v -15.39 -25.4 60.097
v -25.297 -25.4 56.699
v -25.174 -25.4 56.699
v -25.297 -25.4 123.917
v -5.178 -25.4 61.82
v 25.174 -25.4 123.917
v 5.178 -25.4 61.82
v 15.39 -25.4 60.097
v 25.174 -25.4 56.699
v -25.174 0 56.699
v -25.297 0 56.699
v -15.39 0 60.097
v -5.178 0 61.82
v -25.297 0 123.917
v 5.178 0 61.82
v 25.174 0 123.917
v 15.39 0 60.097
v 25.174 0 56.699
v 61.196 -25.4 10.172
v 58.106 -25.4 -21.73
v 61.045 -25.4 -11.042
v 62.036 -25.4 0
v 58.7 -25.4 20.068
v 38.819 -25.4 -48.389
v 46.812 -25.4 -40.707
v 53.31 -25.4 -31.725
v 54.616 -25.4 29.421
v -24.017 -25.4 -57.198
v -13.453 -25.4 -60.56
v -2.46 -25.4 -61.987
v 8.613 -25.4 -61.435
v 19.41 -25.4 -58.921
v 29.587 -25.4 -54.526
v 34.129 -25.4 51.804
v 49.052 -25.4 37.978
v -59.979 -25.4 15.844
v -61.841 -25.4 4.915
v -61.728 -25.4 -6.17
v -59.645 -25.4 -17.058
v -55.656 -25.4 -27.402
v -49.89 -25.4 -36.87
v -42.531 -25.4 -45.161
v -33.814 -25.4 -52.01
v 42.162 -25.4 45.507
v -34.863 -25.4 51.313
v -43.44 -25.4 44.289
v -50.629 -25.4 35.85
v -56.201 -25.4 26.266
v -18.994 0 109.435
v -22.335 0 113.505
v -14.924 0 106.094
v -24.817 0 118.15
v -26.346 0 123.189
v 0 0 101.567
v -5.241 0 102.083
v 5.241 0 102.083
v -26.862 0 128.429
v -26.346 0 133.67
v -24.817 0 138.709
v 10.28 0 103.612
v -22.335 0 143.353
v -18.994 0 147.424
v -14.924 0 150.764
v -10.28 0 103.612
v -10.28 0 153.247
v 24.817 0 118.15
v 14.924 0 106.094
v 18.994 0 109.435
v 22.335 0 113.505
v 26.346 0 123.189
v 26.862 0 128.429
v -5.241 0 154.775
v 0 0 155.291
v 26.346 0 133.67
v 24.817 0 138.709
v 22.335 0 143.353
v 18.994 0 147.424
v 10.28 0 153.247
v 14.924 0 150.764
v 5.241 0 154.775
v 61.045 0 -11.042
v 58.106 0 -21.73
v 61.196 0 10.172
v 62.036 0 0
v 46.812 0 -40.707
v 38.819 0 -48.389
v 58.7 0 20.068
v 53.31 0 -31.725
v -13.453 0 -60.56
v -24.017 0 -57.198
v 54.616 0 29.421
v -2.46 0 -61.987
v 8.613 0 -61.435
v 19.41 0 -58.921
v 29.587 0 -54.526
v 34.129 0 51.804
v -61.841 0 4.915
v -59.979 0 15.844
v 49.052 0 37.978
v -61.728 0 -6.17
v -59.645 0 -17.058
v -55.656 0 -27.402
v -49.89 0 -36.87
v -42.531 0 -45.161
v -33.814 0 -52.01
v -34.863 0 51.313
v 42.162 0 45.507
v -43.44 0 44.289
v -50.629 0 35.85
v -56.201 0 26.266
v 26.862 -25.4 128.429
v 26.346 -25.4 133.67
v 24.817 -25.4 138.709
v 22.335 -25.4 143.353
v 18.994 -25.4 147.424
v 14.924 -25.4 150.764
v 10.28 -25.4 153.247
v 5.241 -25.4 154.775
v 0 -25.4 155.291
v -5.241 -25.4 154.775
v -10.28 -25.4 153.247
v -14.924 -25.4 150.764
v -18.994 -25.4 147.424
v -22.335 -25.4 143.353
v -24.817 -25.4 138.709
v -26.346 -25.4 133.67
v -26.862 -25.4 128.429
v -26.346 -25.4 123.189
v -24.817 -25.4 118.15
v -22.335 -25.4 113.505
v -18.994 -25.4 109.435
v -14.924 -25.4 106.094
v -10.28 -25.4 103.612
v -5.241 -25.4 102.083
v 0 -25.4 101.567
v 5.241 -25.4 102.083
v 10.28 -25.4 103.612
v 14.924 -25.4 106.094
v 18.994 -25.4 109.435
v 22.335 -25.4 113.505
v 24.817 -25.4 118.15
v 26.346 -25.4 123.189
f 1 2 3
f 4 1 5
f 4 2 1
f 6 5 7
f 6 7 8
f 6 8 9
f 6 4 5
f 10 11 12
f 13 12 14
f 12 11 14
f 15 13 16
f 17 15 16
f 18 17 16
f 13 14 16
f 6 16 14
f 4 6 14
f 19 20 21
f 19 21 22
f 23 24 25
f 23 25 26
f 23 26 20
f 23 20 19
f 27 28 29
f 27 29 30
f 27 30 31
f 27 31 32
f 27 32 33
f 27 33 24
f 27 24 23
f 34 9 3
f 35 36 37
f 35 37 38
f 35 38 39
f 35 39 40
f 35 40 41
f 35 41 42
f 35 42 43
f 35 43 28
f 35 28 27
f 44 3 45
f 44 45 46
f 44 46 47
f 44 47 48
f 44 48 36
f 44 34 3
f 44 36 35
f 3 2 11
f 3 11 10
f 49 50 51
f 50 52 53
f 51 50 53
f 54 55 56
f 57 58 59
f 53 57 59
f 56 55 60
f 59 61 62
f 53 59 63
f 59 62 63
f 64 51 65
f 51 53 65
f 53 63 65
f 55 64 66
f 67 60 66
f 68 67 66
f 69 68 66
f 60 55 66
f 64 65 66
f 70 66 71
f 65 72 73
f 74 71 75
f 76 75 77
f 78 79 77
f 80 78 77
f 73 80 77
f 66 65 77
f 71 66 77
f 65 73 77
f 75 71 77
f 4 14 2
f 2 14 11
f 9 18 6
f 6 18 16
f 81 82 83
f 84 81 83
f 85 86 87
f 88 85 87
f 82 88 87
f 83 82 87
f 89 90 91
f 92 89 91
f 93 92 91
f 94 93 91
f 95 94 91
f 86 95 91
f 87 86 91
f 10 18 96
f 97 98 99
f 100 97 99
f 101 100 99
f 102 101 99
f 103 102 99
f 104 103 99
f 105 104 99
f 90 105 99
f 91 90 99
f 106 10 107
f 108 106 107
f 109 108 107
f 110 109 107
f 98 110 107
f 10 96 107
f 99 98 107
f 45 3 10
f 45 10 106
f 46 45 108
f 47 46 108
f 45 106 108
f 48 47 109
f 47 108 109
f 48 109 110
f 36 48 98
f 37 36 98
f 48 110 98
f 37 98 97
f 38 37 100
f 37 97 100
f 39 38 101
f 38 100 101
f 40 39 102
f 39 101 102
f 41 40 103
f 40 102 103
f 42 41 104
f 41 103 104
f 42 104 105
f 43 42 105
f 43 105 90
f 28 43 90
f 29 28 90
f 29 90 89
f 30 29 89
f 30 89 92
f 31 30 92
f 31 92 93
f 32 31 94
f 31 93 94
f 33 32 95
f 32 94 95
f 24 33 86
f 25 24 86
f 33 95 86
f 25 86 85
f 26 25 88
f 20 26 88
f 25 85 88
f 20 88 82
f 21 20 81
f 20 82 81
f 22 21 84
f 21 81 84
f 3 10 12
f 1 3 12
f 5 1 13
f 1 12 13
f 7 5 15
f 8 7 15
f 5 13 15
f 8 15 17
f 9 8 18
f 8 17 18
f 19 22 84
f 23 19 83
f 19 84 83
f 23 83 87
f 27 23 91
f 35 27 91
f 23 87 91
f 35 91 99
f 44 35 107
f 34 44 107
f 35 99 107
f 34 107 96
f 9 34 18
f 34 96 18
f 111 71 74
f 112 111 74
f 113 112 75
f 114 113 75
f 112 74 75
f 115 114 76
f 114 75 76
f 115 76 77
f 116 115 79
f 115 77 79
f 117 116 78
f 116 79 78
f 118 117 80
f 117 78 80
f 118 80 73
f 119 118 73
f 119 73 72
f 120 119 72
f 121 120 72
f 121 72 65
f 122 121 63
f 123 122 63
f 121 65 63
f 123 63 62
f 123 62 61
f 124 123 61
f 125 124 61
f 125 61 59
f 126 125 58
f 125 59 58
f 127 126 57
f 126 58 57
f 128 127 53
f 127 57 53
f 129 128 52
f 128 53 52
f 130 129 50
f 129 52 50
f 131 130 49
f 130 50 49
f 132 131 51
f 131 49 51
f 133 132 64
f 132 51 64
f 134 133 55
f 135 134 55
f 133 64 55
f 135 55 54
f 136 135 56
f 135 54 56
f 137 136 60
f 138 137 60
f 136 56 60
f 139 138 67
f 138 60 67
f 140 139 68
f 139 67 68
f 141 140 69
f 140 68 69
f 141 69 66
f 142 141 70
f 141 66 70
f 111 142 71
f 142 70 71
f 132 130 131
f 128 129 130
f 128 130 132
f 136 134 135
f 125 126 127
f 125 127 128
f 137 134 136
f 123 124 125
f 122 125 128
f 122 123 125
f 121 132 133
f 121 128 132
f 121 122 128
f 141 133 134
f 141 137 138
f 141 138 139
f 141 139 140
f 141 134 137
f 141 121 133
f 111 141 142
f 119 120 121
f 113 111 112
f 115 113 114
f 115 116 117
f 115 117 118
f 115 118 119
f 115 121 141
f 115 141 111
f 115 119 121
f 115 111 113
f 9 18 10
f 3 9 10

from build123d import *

# Parameters (mm, degrees)
F3_DEPTH = 25.4
F1_R     = 26.8621536908


with BuildPart() as f3:
    # F0 (on Front) → F3 (new body)
    with BuildSketch(Plane.XZ):
        with BuildLine():
            ThreePointArc((-25.17354644, 56.6988320916), (-33.8141903188, -52.0102445101), (62.0359976217, 0))
            ThreePointArc((62.0359976217, 0), (52.0102445101, 33.8141903188), (25.17354644, 56.6988320916))
            Line((25.17354644, 56.6988320916), (-25.17354644, 56.6988320916))
        make_face()
    extrude(amount=F3_DEPTH)


with BuildPart() as f3b:
    # F0 (on Front) → F3, piece 2 (new body)
    with BuildSketch(Plane.XZ):
        with BuildLine():
            ThreePointArc((-25.17354644, 56.6988320916), (0, 62.0359976217), (25.17354644, 56.6988320916))
            Line((25.17354644, 56.6988320916), (25.17354644, 123.91667068))
            Line((25.17354644, 123.91667068), (-25.2965986729, 123.91667068))
            Line((-25.2965986729, 123.91667068), (-25.2965986729, 56.6988320916))
            Line((-25.2965986729, 56.6988320916), (-25.17354644, 56.6988320916))
        make_face()
    extrude(amount=F3_DEPTH)


with BuildPart() as f3c:
    # F1 (on Front) → F3, piece 3 (new body)
    with BuildSketch(Plane.XZ):
        with Locations((0, 128.4292787313)):
            Circle(F1_R)
    extrude(amount=F3_DEPTH)


solid = Compound([f3.part, f3b.part, f3c.part])
